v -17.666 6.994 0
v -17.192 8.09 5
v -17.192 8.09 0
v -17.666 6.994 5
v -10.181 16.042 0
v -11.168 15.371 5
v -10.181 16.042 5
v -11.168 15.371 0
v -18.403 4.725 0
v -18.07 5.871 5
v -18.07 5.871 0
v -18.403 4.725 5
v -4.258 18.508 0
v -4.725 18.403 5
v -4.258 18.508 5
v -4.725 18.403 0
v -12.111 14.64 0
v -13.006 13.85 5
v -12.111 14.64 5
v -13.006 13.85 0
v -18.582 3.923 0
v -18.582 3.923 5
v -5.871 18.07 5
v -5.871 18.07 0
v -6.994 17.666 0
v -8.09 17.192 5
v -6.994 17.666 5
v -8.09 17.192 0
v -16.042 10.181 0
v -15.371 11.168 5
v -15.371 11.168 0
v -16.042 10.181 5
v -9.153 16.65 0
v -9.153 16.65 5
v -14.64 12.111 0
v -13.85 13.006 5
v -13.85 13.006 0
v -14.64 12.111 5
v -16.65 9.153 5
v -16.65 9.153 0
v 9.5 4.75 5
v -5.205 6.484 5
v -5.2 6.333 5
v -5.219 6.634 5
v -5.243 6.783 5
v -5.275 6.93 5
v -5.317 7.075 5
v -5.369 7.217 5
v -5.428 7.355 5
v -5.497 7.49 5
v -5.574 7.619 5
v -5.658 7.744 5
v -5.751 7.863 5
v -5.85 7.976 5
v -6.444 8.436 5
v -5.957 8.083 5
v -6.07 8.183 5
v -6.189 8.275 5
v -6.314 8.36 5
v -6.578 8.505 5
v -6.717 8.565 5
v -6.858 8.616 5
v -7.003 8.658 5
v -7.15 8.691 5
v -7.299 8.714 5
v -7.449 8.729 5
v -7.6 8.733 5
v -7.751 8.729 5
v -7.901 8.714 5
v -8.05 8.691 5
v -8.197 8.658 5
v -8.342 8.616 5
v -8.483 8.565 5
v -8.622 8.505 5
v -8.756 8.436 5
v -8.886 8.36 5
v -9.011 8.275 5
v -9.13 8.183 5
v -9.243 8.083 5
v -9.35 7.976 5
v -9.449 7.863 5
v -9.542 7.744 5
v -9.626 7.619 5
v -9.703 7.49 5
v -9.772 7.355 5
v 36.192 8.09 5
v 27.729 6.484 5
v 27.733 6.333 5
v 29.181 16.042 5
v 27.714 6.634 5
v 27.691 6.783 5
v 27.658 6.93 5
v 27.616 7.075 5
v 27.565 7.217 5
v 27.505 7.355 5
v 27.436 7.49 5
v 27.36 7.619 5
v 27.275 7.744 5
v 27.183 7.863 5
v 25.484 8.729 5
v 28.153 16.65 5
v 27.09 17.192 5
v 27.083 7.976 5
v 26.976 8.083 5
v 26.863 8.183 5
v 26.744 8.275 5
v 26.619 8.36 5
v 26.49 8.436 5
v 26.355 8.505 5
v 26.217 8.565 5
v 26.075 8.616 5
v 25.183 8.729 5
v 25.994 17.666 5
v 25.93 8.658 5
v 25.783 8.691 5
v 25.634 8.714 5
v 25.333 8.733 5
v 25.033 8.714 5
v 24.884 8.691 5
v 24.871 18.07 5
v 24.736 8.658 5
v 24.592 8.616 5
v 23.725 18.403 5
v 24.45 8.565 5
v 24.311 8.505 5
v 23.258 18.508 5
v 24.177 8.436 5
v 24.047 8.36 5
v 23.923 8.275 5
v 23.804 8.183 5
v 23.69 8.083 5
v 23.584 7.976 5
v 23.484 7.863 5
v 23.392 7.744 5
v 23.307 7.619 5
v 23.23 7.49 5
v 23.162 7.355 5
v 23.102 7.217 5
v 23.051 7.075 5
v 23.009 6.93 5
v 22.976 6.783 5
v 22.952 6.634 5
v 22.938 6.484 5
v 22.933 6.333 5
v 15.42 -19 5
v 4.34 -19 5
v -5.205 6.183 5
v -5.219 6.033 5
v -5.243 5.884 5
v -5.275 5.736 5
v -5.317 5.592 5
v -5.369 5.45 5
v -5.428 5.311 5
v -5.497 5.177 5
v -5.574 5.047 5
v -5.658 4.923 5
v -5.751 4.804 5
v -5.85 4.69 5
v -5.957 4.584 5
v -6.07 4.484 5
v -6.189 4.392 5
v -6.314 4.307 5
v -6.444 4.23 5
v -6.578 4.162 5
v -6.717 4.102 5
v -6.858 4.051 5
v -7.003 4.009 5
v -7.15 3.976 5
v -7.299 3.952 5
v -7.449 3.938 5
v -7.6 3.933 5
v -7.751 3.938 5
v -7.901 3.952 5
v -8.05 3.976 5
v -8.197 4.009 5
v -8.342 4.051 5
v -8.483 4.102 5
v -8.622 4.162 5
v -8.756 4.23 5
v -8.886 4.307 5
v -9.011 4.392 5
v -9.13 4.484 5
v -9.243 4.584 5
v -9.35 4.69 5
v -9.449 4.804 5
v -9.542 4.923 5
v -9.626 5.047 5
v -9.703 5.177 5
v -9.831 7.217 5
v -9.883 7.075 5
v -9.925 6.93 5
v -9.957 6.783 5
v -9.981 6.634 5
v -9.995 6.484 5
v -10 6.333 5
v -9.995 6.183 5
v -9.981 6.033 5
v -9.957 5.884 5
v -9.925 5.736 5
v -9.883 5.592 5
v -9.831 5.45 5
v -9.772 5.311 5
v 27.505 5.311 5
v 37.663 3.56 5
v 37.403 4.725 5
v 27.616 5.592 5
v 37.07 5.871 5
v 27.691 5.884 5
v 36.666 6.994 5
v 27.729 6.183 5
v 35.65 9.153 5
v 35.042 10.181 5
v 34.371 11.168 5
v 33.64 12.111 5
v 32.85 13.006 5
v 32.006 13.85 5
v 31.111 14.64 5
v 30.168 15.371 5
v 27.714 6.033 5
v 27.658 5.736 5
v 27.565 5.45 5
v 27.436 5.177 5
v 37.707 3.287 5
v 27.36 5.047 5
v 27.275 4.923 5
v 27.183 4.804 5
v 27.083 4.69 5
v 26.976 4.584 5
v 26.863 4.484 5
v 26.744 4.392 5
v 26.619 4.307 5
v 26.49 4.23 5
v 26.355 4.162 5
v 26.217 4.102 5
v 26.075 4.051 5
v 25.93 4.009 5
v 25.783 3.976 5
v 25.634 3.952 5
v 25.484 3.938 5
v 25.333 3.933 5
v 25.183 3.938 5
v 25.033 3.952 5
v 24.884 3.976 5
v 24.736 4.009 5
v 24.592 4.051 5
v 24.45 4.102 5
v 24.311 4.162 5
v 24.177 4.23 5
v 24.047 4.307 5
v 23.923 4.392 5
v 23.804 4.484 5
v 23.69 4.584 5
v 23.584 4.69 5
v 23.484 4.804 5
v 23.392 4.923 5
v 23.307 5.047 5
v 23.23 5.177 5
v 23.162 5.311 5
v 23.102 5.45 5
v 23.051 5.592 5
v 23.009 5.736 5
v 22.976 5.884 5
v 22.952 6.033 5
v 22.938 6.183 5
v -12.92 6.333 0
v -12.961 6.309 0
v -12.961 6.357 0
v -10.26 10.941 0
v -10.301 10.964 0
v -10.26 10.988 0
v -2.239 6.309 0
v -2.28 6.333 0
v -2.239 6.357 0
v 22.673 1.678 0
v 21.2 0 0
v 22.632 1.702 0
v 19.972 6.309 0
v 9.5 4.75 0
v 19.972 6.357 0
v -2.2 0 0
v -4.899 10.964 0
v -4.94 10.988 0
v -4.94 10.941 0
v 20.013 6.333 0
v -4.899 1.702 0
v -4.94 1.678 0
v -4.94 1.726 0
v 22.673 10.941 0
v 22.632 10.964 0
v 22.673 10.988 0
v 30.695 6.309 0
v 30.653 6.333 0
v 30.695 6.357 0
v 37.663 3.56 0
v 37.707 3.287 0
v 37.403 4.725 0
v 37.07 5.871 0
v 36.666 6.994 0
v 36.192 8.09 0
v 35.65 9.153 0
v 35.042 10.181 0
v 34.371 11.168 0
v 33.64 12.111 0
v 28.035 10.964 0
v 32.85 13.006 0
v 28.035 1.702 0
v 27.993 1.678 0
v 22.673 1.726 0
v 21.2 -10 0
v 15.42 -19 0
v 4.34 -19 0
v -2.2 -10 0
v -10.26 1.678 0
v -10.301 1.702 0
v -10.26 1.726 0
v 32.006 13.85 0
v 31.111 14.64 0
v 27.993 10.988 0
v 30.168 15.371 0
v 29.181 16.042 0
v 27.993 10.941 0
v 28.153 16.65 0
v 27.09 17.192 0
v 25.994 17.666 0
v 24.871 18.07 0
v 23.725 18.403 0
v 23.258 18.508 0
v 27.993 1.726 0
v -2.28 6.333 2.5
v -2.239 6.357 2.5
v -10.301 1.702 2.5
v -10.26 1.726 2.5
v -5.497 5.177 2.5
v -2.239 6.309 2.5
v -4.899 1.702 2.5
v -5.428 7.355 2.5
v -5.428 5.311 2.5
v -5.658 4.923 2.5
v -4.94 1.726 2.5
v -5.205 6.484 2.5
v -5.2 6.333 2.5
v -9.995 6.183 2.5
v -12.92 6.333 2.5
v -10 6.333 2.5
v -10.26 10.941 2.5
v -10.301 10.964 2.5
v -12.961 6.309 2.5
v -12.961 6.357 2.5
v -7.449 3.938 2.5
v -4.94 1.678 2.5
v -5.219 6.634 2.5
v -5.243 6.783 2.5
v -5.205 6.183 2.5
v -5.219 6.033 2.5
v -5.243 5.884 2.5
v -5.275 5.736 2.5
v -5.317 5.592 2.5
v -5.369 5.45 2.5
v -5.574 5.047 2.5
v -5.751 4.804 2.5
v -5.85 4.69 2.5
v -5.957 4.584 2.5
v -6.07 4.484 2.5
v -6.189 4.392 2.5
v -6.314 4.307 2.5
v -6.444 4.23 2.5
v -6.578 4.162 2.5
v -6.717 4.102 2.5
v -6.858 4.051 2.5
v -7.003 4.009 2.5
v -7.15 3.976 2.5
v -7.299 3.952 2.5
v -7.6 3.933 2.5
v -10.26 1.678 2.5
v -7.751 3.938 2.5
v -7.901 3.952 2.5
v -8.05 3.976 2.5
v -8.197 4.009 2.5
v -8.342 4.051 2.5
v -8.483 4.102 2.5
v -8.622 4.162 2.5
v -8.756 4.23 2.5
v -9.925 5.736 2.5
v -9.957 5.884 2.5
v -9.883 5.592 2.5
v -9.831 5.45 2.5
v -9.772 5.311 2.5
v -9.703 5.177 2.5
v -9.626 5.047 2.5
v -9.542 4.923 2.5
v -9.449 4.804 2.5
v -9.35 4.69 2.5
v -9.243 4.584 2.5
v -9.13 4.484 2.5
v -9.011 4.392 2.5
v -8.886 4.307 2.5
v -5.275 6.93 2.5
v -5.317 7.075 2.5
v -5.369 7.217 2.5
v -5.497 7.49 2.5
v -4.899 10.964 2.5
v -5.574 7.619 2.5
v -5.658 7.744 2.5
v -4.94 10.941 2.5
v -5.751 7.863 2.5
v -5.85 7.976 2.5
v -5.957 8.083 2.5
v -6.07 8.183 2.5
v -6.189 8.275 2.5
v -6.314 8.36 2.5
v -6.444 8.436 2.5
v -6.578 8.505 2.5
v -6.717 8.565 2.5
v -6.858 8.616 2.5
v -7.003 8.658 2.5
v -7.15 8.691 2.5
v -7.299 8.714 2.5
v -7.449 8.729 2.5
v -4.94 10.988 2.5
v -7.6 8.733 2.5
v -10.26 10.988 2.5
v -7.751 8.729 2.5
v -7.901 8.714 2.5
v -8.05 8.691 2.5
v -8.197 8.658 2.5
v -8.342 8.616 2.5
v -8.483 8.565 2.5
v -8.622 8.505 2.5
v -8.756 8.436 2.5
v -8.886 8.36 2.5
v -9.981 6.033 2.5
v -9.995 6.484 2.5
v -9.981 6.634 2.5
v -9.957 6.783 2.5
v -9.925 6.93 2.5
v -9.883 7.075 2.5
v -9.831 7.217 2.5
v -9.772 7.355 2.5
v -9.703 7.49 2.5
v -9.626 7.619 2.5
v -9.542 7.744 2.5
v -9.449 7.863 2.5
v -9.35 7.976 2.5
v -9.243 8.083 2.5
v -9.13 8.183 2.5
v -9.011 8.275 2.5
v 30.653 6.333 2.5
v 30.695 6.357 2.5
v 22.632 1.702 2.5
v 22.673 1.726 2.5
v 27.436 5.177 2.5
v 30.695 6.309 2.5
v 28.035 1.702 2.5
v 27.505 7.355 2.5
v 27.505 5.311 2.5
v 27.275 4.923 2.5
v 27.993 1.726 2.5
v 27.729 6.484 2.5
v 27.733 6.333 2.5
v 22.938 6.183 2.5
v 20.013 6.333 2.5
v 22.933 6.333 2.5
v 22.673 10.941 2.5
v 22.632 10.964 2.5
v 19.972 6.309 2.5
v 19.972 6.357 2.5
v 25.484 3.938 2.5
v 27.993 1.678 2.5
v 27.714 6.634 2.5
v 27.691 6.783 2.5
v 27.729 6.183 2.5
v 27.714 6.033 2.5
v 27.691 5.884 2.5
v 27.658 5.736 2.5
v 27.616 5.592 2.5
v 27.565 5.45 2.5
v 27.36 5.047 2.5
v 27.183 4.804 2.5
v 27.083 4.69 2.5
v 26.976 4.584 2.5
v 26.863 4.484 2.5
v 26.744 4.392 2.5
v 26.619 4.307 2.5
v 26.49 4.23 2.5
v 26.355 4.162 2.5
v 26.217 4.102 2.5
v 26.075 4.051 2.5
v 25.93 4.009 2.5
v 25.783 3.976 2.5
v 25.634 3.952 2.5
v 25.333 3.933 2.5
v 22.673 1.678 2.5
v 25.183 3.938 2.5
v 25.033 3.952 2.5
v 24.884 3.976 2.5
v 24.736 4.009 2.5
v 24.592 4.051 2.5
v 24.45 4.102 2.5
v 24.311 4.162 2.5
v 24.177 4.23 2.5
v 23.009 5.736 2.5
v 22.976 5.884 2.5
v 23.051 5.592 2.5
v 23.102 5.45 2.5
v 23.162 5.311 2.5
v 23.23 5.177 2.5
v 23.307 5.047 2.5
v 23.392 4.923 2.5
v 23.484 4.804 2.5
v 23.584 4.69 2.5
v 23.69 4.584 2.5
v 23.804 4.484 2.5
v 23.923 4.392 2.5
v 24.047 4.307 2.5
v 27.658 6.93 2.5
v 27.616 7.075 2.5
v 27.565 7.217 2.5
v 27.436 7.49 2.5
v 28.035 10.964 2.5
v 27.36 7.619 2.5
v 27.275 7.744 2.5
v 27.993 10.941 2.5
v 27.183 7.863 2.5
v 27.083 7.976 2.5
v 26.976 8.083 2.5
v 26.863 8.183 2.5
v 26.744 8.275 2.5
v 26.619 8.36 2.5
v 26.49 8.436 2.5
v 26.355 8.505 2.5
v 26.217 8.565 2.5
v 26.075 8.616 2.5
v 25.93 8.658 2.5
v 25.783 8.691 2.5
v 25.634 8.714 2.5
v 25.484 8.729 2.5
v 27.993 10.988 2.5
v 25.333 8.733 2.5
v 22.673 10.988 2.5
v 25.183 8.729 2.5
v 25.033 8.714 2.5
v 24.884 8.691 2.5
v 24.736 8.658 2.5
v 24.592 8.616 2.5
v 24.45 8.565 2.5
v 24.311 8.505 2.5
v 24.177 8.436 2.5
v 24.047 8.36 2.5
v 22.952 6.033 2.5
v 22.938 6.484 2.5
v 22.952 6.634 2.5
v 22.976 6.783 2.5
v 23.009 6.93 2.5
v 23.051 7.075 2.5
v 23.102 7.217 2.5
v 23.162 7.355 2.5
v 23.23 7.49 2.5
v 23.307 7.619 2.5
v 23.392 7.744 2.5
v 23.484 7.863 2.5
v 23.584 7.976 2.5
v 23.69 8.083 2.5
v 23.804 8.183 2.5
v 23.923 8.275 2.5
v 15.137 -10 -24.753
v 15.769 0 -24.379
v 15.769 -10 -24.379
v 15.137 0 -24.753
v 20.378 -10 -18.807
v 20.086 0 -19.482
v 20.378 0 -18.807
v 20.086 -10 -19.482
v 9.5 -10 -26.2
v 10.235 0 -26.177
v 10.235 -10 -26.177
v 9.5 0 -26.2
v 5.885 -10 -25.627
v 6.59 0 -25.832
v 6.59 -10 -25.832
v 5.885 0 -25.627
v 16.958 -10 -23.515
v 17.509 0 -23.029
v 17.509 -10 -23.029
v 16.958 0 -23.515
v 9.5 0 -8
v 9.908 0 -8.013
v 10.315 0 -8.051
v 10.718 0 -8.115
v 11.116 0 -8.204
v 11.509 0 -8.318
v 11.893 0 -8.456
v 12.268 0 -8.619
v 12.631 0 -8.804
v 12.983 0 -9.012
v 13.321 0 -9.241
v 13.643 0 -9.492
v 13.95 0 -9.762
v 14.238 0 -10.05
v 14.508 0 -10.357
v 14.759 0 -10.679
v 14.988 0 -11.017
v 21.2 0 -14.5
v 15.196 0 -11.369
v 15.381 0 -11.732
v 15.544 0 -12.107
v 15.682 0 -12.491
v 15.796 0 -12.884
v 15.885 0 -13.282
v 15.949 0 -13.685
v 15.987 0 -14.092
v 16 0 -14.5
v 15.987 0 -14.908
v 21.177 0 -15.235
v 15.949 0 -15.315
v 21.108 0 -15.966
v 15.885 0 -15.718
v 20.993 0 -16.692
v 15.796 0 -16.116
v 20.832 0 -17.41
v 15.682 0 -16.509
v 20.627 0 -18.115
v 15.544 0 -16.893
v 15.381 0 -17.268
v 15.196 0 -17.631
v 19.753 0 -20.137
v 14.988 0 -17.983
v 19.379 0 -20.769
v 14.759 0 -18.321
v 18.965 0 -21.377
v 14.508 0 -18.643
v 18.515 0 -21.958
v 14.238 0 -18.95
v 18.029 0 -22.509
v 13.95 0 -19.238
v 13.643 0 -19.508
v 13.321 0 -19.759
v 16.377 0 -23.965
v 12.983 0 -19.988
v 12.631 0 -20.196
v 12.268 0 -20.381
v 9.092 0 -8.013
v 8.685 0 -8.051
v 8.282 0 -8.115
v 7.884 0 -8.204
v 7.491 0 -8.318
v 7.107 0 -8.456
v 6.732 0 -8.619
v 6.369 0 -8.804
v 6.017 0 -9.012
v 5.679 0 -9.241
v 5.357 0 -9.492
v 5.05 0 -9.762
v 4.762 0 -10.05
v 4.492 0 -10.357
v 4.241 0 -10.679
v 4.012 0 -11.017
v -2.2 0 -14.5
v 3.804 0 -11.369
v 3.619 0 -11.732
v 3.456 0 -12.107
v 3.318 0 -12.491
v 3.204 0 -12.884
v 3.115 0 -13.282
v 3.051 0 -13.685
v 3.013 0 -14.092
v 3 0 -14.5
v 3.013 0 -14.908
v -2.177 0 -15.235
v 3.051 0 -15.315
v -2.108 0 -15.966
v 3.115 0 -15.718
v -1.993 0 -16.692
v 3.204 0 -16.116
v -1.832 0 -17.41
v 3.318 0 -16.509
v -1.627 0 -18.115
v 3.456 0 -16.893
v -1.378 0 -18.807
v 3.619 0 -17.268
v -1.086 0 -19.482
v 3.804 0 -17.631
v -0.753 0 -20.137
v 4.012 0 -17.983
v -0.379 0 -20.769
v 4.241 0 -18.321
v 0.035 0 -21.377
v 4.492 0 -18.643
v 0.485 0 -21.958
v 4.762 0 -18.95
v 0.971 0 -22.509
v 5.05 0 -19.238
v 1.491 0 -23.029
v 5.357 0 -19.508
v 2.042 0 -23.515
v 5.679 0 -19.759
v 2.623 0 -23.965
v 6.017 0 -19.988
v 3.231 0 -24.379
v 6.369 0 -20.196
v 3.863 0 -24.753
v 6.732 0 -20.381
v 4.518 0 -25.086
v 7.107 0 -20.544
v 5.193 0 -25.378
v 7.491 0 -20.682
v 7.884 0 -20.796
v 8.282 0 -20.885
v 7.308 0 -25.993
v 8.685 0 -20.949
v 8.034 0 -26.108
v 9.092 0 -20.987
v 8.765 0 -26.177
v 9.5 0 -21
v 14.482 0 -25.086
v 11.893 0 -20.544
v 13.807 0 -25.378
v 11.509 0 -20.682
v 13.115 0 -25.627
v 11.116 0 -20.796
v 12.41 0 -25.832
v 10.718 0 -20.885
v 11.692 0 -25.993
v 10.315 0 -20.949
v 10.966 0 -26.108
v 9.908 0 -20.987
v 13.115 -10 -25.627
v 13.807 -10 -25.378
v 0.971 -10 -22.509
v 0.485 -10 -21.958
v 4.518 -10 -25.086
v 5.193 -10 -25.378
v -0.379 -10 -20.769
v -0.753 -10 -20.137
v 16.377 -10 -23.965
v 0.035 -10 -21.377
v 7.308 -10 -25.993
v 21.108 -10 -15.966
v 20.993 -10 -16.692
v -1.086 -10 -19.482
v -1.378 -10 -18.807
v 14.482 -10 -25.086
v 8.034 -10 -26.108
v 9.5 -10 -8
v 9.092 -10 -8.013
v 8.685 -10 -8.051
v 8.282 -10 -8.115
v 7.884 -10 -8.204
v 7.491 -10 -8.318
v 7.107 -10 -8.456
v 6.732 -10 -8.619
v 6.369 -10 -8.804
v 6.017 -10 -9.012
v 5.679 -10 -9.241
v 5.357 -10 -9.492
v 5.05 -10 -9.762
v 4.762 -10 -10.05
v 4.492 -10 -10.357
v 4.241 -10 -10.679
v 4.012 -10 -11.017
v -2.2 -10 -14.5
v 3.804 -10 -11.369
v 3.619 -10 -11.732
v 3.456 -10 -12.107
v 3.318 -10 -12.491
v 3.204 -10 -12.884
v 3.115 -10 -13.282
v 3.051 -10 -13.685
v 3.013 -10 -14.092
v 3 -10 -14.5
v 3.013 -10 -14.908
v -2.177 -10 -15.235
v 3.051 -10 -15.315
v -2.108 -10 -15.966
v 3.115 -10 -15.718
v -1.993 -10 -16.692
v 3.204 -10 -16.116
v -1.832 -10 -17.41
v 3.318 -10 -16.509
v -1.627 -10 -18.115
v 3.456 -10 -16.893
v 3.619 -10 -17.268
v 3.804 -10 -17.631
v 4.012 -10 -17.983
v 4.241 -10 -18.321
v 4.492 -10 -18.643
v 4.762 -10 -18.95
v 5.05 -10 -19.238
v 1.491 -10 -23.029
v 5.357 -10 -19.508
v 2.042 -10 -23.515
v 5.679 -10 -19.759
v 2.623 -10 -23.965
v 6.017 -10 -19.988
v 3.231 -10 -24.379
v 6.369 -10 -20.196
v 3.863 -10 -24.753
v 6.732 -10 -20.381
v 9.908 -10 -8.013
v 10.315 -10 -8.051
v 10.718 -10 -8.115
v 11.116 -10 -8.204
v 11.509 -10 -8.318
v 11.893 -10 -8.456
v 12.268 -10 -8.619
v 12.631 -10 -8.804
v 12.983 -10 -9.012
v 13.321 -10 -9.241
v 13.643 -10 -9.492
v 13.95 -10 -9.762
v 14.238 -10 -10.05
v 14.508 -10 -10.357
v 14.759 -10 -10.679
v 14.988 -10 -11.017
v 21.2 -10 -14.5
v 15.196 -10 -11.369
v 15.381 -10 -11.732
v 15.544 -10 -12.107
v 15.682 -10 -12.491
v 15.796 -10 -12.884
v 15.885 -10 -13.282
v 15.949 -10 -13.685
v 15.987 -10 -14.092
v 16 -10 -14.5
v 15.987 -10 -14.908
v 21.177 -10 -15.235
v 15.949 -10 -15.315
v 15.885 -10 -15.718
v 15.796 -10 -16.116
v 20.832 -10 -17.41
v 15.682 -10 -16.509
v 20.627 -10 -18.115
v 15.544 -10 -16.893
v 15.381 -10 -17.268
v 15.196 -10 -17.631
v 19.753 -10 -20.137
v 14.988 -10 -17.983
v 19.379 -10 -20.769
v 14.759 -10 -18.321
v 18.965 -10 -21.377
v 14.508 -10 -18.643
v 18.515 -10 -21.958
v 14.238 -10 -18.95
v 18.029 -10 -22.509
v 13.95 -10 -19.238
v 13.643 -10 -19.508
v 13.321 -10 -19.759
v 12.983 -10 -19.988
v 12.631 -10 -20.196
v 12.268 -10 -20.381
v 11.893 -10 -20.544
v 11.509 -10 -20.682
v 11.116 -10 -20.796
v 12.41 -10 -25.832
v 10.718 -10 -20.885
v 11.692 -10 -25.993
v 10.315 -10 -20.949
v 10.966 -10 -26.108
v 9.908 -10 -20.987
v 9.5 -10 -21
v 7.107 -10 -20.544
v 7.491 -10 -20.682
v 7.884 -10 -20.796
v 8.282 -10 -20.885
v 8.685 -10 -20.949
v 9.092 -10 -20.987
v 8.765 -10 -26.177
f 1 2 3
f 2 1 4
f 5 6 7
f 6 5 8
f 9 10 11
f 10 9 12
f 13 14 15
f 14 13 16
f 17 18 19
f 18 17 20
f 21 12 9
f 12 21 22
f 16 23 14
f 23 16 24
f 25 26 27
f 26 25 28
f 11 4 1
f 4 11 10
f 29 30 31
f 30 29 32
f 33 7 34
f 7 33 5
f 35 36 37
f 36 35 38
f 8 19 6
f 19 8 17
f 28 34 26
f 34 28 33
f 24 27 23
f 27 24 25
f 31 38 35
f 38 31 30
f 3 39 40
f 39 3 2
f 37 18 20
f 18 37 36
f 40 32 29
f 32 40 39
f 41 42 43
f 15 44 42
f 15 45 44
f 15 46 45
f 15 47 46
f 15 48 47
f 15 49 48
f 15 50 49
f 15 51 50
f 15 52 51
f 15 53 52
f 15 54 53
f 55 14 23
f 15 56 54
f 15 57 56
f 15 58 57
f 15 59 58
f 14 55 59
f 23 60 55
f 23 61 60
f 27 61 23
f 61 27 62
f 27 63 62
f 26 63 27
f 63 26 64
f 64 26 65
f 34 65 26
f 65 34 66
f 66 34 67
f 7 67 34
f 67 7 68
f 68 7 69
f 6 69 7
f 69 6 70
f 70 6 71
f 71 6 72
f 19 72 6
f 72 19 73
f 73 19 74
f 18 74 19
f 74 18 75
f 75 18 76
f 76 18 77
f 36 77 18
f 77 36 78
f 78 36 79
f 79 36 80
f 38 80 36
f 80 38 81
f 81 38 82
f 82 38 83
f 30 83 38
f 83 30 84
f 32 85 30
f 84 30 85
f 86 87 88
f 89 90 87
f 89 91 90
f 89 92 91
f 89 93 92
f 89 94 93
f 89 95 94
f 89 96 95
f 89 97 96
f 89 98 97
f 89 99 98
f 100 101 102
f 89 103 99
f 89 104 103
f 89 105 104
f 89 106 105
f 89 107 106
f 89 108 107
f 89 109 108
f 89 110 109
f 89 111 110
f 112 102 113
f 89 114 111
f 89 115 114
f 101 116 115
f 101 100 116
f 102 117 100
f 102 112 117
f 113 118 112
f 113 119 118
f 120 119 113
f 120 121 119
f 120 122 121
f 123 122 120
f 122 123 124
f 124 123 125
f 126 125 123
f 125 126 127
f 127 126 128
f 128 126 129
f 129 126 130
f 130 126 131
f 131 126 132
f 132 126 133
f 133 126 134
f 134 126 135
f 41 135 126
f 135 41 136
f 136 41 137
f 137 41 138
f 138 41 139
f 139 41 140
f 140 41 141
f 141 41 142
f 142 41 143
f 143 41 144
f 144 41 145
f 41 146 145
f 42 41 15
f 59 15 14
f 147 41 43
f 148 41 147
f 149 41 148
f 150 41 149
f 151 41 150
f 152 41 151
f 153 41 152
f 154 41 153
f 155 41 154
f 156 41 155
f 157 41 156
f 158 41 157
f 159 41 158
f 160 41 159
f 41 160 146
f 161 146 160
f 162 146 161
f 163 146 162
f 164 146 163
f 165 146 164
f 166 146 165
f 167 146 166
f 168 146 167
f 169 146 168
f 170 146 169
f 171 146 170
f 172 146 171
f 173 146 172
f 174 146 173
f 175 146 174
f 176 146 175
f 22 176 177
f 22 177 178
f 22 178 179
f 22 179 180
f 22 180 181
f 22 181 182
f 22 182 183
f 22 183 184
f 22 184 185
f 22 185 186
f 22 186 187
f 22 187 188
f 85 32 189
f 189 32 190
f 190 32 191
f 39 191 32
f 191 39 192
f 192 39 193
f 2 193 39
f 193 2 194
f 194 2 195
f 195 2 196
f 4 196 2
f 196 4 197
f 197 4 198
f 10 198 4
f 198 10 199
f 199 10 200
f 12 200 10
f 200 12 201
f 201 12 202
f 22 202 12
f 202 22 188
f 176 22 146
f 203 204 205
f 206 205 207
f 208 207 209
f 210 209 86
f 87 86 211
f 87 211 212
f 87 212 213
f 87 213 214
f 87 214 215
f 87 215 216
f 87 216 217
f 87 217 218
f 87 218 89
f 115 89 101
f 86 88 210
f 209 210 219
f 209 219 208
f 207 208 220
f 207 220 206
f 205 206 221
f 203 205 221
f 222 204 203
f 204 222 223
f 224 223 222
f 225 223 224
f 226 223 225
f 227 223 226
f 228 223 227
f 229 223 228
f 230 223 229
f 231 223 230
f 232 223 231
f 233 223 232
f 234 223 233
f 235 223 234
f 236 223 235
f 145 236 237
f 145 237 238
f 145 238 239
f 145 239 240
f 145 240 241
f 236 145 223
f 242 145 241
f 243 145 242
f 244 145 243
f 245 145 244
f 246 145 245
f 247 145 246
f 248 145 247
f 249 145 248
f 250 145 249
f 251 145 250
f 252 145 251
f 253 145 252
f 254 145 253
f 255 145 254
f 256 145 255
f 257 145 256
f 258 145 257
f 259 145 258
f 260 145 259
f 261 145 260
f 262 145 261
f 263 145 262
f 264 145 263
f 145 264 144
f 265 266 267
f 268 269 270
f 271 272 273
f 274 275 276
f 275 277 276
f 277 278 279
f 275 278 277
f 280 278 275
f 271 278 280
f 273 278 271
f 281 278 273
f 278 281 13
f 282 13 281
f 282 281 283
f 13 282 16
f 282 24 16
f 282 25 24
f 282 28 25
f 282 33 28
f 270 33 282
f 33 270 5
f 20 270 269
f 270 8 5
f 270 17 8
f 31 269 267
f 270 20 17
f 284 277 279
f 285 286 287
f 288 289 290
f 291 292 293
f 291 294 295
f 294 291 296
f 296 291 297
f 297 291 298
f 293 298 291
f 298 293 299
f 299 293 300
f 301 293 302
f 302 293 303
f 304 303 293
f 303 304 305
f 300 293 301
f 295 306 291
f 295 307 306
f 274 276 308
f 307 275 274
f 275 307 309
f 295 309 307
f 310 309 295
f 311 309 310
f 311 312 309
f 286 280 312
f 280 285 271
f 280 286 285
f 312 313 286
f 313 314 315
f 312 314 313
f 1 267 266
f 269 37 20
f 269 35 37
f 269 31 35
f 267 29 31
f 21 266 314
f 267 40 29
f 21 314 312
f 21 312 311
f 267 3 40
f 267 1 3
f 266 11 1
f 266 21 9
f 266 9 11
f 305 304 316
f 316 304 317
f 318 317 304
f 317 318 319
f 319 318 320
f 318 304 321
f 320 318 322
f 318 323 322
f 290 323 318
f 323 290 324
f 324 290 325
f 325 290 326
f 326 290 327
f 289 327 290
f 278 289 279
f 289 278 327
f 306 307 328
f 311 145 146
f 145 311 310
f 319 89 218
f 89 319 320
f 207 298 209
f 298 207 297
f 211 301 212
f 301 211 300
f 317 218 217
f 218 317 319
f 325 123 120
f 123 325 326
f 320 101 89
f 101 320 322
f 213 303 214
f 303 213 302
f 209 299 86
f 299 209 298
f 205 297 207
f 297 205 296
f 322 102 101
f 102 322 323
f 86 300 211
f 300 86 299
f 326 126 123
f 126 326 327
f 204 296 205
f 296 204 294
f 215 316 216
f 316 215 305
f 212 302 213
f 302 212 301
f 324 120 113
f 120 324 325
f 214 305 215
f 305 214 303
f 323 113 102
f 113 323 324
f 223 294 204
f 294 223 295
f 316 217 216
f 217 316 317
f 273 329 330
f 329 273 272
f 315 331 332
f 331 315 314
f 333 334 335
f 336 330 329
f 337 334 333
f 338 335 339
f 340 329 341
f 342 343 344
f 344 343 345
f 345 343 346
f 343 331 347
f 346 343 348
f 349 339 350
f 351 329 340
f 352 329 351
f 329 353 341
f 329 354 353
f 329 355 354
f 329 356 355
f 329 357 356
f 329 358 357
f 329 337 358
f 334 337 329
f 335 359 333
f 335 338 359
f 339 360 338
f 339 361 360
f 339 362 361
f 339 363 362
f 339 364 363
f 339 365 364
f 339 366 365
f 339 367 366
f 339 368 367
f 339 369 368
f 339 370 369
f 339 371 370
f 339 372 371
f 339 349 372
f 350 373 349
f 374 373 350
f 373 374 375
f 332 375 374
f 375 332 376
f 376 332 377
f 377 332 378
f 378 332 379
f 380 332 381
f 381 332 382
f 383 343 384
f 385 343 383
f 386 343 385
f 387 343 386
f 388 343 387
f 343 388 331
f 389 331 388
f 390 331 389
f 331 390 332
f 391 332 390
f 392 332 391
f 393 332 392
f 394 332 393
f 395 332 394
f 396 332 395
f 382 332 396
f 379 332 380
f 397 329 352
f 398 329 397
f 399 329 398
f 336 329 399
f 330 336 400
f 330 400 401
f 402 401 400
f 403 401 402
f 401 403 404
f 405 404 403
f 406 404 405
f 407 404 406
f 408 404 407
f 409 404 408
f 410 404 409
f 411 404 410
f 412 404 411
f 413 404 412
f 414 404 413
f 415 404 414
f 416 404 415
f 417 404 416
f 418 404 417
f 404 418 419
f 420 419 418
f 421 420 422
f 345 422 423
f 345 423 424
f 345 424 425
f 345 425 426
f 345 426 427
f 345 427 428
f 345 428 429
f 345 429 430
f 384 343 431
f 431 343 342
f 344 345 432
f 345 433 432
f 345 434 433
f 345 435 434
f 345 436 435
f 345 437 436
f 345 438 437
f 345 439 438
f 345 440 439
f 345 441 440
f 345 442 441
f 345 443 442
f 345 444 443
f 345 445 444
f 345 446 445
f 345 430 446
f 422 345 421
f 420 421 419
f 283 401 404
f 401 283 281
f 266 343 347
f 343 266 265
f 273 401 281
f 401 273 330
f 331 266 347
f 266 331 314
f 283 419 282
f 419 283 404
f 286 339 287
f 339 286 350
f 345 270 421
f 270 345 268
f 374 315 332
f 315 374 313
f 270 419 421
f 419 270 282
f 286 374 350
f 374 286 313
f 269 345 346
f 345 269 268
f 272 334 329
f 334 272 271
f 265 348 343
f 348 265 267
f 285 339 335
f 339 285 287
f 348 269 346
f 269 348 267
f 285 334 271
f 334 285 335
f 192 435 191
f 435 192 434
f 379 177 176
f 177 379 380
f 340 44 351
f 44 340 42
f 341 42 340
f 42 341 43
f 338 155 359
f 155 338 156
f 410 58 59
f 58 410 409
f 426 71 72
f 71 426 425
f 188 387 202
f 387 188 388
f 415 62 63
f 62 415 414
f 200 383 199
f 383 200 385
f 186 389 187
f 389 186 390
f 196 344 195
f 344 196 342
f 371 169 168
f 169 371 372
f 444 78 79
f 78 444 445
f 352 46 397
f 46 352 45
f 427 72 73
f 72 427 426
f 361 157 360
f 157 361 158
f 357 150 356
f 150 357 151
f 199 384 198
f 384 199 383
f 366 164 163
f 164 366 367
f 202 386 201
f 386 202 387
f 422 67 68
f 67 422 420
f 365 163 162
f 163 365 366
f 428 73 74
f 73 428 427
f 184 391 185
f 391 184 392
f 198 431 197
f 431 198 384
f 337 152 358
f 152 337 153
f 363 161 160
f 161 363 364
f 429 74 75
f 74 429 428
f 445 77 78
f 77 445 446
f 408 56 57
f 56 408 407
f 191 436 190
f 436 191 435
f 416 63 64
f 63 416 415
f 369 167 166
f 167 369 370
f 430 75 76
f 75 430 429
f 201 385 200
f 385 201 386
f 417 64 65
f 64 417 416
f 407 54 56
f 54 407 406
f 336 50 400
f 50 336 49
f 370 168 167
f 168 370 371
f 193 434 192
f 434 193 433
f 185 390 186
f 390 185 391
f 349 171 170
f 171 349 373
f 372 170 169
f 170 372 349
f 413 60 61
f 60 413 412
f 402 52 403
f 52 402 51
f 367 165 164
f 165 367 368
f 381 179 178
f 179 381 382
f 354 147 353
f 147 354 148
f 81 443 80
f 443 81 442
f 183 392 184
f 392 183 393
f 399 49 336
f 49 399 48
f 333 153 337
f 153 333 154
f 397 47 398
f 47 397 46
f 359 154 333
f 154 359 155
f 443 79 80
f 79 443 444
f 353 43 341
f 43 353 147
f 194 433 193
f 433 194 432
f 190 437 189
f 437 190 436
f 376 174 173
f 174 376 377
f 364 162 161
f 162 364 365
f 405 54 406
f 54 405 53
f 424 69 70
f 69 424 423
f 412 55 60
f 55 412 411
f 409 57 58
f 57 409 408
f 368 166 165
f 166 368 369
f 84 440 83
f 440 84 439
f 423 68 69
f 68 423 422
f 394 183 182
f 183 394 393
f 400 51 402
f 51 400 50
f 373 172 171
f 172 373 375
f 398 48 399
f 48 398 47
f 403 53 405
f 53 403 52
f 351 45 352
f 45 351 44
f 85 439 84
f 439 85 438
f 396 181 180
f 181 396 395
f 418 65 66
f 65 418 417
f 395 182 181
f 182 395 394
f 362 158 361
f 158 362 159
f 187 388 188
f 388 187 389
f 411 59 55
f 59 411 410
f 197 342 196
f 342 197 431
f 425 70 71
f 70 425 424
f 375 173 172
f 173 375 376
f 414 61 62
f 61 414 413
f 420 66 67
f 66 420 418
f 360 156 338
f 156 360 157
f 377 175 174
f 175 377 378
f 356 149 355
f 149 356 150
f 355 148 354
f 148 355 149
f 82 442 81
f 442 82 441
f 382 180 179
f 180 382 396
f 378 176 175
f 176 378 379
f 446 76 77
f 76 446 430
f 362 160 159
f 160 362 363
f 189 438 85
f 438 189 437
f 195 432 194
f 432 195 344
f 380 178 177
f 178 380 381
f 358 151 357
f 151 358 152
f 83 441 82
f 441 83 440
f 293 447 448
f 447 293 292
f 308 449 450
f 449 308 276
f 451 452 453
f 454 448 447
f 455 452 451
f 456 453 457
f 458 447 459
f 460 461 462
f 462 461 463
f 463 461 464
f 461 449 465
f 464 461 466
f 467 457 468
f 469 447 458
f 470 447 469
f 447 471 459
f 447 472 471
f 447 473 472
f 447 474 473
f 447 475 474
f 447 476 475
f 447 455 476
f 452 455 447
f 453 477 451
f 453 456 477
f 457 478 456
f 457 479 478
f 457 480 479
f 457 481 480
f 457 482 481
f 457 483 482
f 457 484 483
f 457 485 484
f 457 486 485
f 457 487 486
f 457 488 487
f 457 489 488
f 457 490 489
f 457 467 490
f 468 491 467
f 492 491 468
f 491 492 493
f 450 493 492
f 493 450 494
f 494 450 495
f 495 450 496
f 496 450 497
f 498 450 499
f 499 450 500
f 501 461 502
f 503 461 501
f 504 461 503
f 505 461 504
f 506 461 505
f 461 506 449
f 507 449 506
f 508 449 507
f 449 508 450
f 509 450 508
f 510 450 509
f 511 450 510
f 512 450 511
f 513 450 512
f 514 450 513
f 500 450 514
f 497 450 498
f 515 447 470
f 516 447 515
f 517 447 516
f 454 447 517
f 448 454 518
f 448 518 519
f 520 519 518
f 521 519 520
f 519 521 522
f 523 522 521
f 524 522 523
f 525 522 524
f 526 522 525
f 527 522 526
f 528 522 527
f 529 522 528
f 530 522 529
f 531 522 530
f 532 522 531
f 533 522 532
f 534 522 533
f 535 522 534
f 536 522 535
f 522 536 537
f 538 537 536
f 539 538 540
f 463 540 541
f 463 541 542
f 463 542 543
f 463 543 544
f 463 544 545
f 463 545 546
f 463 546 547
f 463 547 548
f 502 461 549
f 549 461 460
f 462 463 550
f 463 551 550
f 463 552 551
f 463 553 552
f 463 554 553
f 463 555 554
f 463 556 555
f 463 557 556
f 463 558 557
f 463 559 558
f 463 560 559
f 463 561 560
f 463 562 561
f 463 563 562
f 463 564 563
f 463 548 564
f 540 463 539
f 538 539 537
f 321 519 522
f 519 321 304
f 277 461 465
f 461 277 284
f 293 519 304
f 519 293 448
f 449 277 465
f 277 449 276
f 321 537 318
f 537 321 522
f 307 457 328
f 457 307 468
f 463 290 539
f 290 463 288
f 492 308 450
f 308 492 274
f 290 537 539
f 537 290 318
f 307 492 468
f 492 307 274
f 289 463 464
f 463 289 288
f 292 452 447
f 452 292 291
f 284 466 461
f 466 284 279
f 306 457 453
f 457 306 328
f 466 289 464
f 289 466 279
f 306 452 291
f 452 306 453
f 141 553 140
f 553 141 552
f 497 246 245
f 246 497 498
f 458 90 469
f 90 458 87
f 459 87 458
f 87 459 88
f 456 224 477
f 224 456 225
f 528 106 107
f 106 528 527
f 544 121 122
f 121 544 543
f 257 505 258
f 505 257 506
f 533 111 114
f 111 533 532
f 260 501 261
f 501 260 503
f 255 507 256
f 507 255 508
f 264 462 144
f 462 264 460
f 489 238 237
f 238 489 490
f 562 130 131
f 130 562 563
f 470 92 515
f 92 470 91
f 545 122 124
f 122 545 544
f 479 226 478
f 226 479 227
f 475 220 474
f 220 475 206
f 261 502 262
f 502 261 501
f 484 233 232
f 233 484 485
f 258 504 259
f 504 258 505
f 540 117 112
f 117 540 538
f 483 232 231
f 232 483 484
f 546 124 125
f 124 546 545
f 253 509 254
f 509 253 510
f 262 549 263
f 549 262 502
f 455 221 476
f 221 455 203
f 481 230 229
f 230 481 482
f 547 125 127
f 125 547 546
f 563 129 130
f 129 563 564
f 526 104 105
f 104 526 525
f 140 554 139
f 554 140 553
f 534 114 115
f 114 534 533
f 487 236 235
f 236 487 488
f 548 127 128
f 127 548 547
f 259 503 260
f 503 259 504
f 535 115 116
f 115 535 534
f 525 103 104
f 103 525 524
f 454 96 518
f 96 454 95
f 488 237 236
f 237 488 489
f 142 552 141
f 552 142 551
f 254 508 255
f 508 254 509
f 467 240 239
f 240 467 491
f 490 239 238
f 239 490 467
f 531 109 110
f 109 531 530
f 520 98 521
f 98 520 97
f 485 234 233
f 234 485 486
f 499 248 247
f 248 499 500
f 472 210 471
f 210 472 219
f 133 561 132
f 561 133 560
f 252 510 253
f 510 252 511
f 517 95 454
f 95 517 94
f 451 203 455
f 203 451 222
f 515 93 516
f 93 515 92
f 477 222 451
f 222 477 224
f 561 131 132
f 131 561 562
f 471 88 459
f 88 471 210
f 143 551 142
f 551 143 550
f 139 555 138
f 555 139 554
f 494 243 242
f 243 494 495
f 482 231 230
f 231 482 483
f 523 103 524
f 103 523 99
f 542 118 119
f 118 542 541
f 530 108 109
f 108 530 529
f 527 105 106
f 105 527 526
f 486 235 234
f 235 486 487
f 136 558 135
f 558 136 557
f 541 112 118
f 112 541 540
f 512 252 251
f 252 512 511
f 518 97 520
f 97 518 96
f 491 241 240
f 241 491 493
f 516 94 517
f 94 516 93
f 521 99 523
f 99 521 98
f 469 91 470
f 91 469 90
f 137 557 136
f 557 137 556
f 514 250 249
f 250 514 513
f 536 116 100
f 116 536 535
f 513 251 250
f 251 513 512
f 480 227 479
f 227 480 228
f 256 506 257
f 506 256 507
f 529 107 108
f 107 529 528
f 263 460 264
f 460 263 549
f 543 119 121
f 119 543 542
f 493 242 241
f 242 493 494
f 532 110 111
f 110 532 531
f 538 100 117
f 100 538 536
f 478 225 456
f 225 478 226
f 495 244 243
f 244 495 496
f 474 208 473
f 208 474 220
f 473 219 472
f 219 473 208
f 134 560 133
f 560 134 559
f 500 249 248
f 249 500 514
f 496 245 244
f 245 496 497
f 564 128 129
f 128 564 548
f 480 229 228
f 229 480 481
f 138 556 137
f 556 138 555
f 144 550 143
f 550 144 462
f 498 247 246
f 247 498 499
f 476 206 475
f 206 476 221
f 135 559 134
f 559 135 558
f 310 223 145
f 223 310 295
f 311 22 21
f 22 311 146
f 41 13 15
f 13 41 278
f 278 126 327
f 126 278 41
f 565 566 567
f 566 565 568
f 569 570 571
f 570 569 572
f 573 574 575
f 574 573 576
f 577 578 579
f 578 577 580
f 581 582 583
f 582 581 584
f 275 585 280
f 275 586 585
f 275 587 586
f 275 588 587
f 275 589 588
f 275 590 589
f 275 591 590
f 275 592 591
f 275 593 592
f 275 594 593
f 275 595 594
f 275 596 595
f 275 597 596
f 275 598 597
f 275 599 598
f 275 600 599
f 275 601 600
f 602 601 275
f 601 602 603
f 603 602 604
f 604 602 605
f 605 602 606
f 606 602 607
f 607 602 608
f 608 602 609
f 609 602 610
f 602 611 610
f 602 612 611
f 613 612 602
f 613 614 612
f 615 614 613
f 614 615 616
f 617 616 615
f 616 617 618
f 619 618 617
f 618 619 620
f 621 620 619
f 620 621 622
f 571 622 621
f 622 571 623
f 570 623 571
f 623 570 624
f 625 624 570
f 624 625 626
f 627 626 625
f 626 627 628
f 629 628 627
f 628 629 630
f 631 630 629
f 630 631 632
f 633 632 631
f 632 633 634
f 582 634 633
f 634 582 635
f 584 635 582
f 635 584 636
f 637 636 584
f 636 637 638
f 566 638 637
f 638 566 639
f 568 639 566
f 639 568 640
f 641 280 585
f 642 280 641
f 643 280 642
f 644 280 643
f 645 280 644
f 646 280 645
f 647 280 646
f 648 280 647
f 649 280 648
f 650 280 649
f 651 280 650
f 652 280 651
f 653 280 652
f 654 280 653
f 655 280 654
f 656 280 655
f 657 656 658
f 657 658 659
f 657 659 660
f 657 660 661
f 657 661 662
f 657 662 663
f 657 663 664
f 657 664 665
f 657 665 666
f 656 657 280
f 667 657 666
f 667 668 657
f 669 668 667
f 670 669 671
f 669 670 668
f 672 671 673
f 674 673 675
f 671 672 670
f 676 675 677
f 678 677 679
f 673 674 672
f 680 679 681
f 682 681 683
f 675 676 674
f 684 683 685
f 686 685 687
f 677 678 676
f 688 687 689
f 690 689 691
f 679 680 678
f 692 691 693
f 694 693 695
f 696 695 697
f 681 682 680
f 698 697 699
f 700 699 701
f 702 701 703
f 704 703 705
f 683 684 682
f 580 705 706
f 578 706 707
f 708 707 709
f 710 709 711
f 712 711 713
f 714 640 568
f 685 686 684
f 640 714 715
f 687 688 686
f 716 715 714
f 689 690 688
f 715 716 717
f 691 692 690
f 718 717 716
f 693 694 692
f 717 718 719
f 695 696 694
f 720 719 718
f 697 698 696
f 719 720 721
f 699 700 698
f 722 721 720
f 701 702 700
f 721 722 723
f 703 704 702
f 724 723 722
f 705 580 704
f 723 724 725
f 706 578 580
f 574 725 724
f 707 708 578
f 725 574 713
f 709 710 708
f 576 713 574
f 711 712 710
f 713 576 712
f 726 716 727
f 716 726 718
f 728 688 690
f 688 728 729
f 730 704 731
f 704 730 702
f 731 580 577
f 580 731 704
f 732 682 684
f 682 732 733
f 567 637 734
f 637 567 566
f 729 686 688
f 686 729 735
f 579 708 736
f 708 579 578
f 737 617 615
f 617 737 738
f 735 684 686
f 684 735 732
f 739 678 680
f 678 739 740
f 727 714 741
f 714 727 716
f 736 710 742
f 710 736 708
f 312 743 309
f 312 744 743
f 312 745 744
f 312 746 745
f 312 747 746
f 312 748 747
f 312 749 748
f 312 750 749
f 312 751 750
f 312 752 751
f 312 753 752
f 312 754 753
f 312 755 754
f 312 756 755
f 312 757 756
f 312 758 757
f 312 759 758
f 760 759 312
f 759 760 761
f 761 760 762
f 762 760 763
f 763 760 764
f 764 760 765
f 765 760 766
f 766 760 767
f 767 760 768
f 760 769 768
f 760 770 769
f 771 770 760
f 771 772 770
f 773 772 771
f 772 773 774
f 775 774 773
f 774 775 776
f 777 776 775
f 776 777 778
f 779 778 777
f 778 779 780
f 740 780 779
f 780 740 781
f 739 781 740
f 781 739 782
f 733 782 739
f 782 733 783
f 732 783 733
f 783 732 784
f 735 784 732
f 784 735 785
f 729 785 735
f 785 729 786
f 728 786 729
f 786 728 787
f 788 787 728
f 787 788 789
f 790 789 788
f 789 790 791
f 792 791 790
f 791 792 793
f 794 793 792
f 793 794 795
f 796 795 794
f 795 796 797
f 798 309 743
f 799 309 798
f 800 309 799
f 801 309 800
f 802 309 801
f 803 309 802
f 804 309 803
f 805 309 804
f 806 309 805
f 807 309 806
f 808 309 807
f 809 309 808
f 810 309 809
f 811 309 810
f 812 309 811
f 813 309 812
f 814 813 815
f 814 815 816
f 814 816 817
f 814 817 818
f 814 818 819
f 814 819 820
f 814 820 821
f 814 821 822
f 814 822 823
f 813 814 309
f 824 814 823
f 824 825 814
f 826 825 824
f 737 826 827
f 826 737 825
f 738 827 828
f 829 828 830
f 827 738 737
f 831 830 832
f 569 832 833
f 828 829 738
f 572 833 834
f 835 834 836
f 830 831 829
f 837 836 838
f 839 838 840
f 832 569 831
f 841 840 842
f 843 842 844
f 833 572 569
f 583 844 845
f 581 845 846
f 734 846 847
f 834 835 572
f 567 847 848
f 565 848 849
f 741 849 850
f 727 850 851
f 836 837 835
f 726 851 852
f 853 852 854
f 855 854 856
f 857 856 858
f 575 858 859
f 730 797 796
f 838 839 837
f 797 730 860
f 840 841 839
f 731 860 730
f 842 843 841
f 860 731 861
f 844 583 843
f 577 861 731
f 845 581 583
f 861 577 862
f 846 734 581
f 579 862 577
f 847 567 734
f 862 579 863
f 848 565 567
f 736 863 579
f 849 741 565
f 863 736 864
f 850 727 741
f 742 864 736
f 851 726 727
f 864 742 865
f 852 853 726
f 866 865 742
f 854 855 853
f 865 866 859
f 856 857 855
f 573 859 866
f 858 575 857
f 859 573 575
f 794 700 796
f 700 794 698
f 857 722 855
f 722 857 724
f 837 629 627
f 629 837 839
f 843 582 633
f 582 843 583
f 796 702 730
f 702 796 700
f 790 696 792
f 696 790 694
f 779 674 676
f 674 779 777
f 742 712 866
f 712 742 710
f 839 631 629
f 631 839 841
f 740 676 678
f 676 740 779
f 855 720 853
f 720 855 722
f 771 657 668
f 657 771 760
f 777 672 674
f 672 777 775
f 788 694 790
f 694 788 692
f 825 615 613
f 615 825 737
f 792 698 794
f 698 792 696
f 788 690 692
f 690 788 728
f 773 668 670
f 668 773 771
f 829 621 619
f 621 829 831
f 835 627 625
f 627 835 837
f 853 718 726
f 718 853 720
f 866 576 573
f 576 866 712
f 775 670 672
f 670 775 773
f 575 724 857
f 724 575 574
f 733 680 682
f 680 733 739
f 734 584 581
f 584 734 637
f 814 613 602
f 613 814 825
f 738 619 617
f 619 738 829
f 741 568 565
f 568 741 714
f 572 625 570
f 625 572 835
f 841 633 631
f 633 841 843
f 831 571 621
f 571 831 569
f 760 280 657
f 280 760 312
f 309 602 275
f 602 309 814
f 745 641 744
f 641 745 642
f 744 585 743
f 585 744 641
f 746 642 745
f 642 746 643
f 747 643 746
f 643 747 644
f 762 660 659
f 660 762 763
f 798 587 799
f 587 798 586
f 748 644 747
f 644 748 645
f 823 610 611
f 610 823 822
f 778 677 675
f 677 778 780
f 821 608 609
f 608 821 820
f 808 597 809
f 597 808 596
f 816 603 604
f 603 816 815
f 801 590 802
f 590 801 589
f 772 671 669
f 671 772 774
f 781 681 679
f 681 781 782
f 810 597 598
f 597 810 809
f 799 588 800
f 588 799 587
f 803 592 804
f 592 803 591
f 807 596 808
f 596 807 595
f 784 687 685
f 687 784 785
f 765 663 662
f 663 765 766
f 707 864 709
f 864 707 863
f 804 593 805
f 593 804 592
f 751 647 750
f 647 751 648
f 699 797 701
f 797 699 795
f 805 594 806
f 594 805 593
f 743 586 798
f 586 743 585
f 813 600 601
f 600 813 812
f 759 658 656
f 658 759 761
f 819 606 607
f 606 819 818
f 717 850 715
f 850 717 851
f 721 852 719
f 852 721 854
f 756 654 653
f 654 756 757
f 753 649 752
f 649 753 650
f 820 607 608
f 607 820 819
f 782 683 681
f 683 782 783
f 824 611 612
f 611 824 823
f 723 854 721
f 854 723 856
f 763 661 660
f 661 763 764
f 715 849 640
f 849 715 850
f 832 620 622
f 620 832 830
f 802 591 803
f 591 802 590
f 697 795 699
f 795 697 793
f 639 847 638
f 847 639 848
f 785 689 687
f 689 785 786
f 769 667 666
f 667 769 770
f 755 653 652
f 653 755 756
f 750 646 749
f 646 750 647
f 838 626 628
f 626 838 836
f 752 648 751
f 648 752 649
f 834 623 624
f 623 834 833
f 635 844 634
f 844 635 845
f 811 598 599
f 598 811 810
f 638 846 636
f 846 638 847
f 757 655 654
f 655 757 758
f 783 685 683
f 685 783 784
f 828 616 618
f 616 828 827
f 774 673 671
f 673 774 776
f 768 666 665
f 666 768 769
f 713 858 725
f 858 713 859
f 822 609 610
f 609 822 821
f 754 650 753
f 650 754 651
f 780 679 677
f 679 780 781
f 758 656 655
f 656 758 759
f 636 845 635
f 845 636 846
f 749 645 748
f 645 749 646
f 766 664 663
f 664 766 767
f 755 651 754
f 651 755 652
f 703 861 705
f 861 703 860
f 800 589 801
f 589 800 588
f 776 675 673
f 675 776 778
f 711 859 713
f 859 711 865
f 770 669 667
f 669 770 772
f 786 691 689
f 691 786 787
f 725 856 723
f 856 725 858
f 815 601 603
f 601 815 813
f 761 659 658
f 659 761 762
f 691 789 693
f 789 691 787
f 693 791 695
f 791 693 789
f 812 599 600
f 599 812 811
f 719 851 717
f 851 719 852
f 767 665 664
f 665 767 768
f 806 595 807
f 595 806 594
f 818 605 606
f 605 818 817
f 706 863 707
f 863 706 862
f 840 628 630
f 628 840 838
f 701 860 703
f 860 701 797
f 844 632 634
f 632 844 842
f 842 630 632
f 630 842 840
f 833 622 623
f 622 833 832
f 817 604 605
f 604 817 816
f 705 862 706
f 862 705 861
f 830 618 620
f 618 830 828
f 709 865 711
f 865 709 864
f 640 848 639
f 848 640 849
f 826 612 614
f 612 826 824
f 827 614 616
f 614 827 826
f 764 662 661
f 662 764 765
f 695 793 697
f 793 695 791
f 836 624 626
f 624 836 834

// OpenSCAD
// file: bolts.scad
$radial_error = 0.1;

module cylinder_outer(height, radius, fn = 32) {
	fudge = 1/cos(180/fn);
	cylinder(h=height,r=radius*fudge+$radial_error, $fn=fn);
}

module cylinder_inner(height, radius, fn = 32) {
	cylinder(h=height,r=radius-$radial_error,$fn=fn);
}

// Make a hole for a bolt/screw combination.
module bolt(diameter=3, depth=8, nut_offset=2, shaft_length=10, inset=10) {
	hole(diameter, depth, inset);
	hull() {
		shaft_width = diameter;
		translate([0, 0, nut_offset]) rotate(360/12, [0, 0, 1]) cylinder_outer(diameter, shaft_width, 6);
		translate([0, shaft_length, nut_offset]) rotate(360/12, [0, 0, 1]) cylinder_outer(diameter, shaft_width, 6);
	}
}

// Make a hole. The diameter is the size of the screw (e.g. 3 for M3). Depth is how far the hole should go for the thread, and inset is how far out there should be a hole for the head to go.
module hole(diameter=3, depth=6, inset=10) {
	cylinder_outer(depth, diameter/2);
	translate([0, 0, depth]) cylinder_outer(inset, diameter, 32);
}

module mounting_hole(diameter=3, depth=6, inset=10, outset=3) {
	difference() {
		cylinder_outer(depth, diameter/2+outset);
		hole(diameter=diameter, depth=depth, inset=inset);
	}
}
// main file
include <bolts.scad>

//RadialBallBearing(key="608", type="open", part_mode="default");
//!RadialBallBearing_dims(key="608", type="open", part_mode="default");

$fn=100;
nutwidth = 9.5;
screwdia = 4.8;
basewidth = nutwidth * 4;
thickness = 5;
roddia = 13;

module hexagon(size, height) {
  boxWidth = size/1.75;
  for (r = [-60, 0, 60]) rotate([0,0,r]) cube([boxWidth, size, height], true);
}

difference() {
	union() {
		cylinder(r=basewidth/2, thickness);
		translate([0,-1 * basewidth / 2,0]) cube([basewidth/2,basewidth,thickness]);
		translate([basewidth/2,0,0]) cylinder(r=basewidth/2, thickness);
	}
	translate([-1 * basewidth / 5,basewidth / 6,-1])
	union() {
		hexagon(nutwidth * 0.98,7);
		cylinder(r=(screwdia / 2),20);
	}
	translate([basewidth / 1.5,basewidth / 6,-1])
	union() {
		hexagon(nutwidth * 0.98,7);
		cylinder(r=(screwdia / 2),20);
	}
	
	translate([1.1 * basewidth,-1.22 * basewidth,-1])
	rotate([0,0,45])
	cube(basewidth,2 * basewidth,2 * thickness);

	translate([-1.3 * basewidth,-0.5 * basewidth,-1 * thickness])
	rotate([0,0,-45])
	cube(basewidth,2 * basewidth,2 * thickness);

	translate([0.25 * basewidth,basewidth / 8,-1])
	rotate([0,0,45])
	cube(basewidth, basewidth, 2 * thickness);
}

translate([basewidth / 4,0,-8 - roddia/2])
rotate([0,270,90])
difference() {
	union() {
		cylinder(r=roddia * 0.9, 2 * thickness);
		translate([0,-0.9 * roddia,0]) 
		cube([1.4 * roddia,1.8 * roddia,2 * thickness]);
	}
	translate([0,0,-1])
	cylinder(r=roddia / 2,20);
}
